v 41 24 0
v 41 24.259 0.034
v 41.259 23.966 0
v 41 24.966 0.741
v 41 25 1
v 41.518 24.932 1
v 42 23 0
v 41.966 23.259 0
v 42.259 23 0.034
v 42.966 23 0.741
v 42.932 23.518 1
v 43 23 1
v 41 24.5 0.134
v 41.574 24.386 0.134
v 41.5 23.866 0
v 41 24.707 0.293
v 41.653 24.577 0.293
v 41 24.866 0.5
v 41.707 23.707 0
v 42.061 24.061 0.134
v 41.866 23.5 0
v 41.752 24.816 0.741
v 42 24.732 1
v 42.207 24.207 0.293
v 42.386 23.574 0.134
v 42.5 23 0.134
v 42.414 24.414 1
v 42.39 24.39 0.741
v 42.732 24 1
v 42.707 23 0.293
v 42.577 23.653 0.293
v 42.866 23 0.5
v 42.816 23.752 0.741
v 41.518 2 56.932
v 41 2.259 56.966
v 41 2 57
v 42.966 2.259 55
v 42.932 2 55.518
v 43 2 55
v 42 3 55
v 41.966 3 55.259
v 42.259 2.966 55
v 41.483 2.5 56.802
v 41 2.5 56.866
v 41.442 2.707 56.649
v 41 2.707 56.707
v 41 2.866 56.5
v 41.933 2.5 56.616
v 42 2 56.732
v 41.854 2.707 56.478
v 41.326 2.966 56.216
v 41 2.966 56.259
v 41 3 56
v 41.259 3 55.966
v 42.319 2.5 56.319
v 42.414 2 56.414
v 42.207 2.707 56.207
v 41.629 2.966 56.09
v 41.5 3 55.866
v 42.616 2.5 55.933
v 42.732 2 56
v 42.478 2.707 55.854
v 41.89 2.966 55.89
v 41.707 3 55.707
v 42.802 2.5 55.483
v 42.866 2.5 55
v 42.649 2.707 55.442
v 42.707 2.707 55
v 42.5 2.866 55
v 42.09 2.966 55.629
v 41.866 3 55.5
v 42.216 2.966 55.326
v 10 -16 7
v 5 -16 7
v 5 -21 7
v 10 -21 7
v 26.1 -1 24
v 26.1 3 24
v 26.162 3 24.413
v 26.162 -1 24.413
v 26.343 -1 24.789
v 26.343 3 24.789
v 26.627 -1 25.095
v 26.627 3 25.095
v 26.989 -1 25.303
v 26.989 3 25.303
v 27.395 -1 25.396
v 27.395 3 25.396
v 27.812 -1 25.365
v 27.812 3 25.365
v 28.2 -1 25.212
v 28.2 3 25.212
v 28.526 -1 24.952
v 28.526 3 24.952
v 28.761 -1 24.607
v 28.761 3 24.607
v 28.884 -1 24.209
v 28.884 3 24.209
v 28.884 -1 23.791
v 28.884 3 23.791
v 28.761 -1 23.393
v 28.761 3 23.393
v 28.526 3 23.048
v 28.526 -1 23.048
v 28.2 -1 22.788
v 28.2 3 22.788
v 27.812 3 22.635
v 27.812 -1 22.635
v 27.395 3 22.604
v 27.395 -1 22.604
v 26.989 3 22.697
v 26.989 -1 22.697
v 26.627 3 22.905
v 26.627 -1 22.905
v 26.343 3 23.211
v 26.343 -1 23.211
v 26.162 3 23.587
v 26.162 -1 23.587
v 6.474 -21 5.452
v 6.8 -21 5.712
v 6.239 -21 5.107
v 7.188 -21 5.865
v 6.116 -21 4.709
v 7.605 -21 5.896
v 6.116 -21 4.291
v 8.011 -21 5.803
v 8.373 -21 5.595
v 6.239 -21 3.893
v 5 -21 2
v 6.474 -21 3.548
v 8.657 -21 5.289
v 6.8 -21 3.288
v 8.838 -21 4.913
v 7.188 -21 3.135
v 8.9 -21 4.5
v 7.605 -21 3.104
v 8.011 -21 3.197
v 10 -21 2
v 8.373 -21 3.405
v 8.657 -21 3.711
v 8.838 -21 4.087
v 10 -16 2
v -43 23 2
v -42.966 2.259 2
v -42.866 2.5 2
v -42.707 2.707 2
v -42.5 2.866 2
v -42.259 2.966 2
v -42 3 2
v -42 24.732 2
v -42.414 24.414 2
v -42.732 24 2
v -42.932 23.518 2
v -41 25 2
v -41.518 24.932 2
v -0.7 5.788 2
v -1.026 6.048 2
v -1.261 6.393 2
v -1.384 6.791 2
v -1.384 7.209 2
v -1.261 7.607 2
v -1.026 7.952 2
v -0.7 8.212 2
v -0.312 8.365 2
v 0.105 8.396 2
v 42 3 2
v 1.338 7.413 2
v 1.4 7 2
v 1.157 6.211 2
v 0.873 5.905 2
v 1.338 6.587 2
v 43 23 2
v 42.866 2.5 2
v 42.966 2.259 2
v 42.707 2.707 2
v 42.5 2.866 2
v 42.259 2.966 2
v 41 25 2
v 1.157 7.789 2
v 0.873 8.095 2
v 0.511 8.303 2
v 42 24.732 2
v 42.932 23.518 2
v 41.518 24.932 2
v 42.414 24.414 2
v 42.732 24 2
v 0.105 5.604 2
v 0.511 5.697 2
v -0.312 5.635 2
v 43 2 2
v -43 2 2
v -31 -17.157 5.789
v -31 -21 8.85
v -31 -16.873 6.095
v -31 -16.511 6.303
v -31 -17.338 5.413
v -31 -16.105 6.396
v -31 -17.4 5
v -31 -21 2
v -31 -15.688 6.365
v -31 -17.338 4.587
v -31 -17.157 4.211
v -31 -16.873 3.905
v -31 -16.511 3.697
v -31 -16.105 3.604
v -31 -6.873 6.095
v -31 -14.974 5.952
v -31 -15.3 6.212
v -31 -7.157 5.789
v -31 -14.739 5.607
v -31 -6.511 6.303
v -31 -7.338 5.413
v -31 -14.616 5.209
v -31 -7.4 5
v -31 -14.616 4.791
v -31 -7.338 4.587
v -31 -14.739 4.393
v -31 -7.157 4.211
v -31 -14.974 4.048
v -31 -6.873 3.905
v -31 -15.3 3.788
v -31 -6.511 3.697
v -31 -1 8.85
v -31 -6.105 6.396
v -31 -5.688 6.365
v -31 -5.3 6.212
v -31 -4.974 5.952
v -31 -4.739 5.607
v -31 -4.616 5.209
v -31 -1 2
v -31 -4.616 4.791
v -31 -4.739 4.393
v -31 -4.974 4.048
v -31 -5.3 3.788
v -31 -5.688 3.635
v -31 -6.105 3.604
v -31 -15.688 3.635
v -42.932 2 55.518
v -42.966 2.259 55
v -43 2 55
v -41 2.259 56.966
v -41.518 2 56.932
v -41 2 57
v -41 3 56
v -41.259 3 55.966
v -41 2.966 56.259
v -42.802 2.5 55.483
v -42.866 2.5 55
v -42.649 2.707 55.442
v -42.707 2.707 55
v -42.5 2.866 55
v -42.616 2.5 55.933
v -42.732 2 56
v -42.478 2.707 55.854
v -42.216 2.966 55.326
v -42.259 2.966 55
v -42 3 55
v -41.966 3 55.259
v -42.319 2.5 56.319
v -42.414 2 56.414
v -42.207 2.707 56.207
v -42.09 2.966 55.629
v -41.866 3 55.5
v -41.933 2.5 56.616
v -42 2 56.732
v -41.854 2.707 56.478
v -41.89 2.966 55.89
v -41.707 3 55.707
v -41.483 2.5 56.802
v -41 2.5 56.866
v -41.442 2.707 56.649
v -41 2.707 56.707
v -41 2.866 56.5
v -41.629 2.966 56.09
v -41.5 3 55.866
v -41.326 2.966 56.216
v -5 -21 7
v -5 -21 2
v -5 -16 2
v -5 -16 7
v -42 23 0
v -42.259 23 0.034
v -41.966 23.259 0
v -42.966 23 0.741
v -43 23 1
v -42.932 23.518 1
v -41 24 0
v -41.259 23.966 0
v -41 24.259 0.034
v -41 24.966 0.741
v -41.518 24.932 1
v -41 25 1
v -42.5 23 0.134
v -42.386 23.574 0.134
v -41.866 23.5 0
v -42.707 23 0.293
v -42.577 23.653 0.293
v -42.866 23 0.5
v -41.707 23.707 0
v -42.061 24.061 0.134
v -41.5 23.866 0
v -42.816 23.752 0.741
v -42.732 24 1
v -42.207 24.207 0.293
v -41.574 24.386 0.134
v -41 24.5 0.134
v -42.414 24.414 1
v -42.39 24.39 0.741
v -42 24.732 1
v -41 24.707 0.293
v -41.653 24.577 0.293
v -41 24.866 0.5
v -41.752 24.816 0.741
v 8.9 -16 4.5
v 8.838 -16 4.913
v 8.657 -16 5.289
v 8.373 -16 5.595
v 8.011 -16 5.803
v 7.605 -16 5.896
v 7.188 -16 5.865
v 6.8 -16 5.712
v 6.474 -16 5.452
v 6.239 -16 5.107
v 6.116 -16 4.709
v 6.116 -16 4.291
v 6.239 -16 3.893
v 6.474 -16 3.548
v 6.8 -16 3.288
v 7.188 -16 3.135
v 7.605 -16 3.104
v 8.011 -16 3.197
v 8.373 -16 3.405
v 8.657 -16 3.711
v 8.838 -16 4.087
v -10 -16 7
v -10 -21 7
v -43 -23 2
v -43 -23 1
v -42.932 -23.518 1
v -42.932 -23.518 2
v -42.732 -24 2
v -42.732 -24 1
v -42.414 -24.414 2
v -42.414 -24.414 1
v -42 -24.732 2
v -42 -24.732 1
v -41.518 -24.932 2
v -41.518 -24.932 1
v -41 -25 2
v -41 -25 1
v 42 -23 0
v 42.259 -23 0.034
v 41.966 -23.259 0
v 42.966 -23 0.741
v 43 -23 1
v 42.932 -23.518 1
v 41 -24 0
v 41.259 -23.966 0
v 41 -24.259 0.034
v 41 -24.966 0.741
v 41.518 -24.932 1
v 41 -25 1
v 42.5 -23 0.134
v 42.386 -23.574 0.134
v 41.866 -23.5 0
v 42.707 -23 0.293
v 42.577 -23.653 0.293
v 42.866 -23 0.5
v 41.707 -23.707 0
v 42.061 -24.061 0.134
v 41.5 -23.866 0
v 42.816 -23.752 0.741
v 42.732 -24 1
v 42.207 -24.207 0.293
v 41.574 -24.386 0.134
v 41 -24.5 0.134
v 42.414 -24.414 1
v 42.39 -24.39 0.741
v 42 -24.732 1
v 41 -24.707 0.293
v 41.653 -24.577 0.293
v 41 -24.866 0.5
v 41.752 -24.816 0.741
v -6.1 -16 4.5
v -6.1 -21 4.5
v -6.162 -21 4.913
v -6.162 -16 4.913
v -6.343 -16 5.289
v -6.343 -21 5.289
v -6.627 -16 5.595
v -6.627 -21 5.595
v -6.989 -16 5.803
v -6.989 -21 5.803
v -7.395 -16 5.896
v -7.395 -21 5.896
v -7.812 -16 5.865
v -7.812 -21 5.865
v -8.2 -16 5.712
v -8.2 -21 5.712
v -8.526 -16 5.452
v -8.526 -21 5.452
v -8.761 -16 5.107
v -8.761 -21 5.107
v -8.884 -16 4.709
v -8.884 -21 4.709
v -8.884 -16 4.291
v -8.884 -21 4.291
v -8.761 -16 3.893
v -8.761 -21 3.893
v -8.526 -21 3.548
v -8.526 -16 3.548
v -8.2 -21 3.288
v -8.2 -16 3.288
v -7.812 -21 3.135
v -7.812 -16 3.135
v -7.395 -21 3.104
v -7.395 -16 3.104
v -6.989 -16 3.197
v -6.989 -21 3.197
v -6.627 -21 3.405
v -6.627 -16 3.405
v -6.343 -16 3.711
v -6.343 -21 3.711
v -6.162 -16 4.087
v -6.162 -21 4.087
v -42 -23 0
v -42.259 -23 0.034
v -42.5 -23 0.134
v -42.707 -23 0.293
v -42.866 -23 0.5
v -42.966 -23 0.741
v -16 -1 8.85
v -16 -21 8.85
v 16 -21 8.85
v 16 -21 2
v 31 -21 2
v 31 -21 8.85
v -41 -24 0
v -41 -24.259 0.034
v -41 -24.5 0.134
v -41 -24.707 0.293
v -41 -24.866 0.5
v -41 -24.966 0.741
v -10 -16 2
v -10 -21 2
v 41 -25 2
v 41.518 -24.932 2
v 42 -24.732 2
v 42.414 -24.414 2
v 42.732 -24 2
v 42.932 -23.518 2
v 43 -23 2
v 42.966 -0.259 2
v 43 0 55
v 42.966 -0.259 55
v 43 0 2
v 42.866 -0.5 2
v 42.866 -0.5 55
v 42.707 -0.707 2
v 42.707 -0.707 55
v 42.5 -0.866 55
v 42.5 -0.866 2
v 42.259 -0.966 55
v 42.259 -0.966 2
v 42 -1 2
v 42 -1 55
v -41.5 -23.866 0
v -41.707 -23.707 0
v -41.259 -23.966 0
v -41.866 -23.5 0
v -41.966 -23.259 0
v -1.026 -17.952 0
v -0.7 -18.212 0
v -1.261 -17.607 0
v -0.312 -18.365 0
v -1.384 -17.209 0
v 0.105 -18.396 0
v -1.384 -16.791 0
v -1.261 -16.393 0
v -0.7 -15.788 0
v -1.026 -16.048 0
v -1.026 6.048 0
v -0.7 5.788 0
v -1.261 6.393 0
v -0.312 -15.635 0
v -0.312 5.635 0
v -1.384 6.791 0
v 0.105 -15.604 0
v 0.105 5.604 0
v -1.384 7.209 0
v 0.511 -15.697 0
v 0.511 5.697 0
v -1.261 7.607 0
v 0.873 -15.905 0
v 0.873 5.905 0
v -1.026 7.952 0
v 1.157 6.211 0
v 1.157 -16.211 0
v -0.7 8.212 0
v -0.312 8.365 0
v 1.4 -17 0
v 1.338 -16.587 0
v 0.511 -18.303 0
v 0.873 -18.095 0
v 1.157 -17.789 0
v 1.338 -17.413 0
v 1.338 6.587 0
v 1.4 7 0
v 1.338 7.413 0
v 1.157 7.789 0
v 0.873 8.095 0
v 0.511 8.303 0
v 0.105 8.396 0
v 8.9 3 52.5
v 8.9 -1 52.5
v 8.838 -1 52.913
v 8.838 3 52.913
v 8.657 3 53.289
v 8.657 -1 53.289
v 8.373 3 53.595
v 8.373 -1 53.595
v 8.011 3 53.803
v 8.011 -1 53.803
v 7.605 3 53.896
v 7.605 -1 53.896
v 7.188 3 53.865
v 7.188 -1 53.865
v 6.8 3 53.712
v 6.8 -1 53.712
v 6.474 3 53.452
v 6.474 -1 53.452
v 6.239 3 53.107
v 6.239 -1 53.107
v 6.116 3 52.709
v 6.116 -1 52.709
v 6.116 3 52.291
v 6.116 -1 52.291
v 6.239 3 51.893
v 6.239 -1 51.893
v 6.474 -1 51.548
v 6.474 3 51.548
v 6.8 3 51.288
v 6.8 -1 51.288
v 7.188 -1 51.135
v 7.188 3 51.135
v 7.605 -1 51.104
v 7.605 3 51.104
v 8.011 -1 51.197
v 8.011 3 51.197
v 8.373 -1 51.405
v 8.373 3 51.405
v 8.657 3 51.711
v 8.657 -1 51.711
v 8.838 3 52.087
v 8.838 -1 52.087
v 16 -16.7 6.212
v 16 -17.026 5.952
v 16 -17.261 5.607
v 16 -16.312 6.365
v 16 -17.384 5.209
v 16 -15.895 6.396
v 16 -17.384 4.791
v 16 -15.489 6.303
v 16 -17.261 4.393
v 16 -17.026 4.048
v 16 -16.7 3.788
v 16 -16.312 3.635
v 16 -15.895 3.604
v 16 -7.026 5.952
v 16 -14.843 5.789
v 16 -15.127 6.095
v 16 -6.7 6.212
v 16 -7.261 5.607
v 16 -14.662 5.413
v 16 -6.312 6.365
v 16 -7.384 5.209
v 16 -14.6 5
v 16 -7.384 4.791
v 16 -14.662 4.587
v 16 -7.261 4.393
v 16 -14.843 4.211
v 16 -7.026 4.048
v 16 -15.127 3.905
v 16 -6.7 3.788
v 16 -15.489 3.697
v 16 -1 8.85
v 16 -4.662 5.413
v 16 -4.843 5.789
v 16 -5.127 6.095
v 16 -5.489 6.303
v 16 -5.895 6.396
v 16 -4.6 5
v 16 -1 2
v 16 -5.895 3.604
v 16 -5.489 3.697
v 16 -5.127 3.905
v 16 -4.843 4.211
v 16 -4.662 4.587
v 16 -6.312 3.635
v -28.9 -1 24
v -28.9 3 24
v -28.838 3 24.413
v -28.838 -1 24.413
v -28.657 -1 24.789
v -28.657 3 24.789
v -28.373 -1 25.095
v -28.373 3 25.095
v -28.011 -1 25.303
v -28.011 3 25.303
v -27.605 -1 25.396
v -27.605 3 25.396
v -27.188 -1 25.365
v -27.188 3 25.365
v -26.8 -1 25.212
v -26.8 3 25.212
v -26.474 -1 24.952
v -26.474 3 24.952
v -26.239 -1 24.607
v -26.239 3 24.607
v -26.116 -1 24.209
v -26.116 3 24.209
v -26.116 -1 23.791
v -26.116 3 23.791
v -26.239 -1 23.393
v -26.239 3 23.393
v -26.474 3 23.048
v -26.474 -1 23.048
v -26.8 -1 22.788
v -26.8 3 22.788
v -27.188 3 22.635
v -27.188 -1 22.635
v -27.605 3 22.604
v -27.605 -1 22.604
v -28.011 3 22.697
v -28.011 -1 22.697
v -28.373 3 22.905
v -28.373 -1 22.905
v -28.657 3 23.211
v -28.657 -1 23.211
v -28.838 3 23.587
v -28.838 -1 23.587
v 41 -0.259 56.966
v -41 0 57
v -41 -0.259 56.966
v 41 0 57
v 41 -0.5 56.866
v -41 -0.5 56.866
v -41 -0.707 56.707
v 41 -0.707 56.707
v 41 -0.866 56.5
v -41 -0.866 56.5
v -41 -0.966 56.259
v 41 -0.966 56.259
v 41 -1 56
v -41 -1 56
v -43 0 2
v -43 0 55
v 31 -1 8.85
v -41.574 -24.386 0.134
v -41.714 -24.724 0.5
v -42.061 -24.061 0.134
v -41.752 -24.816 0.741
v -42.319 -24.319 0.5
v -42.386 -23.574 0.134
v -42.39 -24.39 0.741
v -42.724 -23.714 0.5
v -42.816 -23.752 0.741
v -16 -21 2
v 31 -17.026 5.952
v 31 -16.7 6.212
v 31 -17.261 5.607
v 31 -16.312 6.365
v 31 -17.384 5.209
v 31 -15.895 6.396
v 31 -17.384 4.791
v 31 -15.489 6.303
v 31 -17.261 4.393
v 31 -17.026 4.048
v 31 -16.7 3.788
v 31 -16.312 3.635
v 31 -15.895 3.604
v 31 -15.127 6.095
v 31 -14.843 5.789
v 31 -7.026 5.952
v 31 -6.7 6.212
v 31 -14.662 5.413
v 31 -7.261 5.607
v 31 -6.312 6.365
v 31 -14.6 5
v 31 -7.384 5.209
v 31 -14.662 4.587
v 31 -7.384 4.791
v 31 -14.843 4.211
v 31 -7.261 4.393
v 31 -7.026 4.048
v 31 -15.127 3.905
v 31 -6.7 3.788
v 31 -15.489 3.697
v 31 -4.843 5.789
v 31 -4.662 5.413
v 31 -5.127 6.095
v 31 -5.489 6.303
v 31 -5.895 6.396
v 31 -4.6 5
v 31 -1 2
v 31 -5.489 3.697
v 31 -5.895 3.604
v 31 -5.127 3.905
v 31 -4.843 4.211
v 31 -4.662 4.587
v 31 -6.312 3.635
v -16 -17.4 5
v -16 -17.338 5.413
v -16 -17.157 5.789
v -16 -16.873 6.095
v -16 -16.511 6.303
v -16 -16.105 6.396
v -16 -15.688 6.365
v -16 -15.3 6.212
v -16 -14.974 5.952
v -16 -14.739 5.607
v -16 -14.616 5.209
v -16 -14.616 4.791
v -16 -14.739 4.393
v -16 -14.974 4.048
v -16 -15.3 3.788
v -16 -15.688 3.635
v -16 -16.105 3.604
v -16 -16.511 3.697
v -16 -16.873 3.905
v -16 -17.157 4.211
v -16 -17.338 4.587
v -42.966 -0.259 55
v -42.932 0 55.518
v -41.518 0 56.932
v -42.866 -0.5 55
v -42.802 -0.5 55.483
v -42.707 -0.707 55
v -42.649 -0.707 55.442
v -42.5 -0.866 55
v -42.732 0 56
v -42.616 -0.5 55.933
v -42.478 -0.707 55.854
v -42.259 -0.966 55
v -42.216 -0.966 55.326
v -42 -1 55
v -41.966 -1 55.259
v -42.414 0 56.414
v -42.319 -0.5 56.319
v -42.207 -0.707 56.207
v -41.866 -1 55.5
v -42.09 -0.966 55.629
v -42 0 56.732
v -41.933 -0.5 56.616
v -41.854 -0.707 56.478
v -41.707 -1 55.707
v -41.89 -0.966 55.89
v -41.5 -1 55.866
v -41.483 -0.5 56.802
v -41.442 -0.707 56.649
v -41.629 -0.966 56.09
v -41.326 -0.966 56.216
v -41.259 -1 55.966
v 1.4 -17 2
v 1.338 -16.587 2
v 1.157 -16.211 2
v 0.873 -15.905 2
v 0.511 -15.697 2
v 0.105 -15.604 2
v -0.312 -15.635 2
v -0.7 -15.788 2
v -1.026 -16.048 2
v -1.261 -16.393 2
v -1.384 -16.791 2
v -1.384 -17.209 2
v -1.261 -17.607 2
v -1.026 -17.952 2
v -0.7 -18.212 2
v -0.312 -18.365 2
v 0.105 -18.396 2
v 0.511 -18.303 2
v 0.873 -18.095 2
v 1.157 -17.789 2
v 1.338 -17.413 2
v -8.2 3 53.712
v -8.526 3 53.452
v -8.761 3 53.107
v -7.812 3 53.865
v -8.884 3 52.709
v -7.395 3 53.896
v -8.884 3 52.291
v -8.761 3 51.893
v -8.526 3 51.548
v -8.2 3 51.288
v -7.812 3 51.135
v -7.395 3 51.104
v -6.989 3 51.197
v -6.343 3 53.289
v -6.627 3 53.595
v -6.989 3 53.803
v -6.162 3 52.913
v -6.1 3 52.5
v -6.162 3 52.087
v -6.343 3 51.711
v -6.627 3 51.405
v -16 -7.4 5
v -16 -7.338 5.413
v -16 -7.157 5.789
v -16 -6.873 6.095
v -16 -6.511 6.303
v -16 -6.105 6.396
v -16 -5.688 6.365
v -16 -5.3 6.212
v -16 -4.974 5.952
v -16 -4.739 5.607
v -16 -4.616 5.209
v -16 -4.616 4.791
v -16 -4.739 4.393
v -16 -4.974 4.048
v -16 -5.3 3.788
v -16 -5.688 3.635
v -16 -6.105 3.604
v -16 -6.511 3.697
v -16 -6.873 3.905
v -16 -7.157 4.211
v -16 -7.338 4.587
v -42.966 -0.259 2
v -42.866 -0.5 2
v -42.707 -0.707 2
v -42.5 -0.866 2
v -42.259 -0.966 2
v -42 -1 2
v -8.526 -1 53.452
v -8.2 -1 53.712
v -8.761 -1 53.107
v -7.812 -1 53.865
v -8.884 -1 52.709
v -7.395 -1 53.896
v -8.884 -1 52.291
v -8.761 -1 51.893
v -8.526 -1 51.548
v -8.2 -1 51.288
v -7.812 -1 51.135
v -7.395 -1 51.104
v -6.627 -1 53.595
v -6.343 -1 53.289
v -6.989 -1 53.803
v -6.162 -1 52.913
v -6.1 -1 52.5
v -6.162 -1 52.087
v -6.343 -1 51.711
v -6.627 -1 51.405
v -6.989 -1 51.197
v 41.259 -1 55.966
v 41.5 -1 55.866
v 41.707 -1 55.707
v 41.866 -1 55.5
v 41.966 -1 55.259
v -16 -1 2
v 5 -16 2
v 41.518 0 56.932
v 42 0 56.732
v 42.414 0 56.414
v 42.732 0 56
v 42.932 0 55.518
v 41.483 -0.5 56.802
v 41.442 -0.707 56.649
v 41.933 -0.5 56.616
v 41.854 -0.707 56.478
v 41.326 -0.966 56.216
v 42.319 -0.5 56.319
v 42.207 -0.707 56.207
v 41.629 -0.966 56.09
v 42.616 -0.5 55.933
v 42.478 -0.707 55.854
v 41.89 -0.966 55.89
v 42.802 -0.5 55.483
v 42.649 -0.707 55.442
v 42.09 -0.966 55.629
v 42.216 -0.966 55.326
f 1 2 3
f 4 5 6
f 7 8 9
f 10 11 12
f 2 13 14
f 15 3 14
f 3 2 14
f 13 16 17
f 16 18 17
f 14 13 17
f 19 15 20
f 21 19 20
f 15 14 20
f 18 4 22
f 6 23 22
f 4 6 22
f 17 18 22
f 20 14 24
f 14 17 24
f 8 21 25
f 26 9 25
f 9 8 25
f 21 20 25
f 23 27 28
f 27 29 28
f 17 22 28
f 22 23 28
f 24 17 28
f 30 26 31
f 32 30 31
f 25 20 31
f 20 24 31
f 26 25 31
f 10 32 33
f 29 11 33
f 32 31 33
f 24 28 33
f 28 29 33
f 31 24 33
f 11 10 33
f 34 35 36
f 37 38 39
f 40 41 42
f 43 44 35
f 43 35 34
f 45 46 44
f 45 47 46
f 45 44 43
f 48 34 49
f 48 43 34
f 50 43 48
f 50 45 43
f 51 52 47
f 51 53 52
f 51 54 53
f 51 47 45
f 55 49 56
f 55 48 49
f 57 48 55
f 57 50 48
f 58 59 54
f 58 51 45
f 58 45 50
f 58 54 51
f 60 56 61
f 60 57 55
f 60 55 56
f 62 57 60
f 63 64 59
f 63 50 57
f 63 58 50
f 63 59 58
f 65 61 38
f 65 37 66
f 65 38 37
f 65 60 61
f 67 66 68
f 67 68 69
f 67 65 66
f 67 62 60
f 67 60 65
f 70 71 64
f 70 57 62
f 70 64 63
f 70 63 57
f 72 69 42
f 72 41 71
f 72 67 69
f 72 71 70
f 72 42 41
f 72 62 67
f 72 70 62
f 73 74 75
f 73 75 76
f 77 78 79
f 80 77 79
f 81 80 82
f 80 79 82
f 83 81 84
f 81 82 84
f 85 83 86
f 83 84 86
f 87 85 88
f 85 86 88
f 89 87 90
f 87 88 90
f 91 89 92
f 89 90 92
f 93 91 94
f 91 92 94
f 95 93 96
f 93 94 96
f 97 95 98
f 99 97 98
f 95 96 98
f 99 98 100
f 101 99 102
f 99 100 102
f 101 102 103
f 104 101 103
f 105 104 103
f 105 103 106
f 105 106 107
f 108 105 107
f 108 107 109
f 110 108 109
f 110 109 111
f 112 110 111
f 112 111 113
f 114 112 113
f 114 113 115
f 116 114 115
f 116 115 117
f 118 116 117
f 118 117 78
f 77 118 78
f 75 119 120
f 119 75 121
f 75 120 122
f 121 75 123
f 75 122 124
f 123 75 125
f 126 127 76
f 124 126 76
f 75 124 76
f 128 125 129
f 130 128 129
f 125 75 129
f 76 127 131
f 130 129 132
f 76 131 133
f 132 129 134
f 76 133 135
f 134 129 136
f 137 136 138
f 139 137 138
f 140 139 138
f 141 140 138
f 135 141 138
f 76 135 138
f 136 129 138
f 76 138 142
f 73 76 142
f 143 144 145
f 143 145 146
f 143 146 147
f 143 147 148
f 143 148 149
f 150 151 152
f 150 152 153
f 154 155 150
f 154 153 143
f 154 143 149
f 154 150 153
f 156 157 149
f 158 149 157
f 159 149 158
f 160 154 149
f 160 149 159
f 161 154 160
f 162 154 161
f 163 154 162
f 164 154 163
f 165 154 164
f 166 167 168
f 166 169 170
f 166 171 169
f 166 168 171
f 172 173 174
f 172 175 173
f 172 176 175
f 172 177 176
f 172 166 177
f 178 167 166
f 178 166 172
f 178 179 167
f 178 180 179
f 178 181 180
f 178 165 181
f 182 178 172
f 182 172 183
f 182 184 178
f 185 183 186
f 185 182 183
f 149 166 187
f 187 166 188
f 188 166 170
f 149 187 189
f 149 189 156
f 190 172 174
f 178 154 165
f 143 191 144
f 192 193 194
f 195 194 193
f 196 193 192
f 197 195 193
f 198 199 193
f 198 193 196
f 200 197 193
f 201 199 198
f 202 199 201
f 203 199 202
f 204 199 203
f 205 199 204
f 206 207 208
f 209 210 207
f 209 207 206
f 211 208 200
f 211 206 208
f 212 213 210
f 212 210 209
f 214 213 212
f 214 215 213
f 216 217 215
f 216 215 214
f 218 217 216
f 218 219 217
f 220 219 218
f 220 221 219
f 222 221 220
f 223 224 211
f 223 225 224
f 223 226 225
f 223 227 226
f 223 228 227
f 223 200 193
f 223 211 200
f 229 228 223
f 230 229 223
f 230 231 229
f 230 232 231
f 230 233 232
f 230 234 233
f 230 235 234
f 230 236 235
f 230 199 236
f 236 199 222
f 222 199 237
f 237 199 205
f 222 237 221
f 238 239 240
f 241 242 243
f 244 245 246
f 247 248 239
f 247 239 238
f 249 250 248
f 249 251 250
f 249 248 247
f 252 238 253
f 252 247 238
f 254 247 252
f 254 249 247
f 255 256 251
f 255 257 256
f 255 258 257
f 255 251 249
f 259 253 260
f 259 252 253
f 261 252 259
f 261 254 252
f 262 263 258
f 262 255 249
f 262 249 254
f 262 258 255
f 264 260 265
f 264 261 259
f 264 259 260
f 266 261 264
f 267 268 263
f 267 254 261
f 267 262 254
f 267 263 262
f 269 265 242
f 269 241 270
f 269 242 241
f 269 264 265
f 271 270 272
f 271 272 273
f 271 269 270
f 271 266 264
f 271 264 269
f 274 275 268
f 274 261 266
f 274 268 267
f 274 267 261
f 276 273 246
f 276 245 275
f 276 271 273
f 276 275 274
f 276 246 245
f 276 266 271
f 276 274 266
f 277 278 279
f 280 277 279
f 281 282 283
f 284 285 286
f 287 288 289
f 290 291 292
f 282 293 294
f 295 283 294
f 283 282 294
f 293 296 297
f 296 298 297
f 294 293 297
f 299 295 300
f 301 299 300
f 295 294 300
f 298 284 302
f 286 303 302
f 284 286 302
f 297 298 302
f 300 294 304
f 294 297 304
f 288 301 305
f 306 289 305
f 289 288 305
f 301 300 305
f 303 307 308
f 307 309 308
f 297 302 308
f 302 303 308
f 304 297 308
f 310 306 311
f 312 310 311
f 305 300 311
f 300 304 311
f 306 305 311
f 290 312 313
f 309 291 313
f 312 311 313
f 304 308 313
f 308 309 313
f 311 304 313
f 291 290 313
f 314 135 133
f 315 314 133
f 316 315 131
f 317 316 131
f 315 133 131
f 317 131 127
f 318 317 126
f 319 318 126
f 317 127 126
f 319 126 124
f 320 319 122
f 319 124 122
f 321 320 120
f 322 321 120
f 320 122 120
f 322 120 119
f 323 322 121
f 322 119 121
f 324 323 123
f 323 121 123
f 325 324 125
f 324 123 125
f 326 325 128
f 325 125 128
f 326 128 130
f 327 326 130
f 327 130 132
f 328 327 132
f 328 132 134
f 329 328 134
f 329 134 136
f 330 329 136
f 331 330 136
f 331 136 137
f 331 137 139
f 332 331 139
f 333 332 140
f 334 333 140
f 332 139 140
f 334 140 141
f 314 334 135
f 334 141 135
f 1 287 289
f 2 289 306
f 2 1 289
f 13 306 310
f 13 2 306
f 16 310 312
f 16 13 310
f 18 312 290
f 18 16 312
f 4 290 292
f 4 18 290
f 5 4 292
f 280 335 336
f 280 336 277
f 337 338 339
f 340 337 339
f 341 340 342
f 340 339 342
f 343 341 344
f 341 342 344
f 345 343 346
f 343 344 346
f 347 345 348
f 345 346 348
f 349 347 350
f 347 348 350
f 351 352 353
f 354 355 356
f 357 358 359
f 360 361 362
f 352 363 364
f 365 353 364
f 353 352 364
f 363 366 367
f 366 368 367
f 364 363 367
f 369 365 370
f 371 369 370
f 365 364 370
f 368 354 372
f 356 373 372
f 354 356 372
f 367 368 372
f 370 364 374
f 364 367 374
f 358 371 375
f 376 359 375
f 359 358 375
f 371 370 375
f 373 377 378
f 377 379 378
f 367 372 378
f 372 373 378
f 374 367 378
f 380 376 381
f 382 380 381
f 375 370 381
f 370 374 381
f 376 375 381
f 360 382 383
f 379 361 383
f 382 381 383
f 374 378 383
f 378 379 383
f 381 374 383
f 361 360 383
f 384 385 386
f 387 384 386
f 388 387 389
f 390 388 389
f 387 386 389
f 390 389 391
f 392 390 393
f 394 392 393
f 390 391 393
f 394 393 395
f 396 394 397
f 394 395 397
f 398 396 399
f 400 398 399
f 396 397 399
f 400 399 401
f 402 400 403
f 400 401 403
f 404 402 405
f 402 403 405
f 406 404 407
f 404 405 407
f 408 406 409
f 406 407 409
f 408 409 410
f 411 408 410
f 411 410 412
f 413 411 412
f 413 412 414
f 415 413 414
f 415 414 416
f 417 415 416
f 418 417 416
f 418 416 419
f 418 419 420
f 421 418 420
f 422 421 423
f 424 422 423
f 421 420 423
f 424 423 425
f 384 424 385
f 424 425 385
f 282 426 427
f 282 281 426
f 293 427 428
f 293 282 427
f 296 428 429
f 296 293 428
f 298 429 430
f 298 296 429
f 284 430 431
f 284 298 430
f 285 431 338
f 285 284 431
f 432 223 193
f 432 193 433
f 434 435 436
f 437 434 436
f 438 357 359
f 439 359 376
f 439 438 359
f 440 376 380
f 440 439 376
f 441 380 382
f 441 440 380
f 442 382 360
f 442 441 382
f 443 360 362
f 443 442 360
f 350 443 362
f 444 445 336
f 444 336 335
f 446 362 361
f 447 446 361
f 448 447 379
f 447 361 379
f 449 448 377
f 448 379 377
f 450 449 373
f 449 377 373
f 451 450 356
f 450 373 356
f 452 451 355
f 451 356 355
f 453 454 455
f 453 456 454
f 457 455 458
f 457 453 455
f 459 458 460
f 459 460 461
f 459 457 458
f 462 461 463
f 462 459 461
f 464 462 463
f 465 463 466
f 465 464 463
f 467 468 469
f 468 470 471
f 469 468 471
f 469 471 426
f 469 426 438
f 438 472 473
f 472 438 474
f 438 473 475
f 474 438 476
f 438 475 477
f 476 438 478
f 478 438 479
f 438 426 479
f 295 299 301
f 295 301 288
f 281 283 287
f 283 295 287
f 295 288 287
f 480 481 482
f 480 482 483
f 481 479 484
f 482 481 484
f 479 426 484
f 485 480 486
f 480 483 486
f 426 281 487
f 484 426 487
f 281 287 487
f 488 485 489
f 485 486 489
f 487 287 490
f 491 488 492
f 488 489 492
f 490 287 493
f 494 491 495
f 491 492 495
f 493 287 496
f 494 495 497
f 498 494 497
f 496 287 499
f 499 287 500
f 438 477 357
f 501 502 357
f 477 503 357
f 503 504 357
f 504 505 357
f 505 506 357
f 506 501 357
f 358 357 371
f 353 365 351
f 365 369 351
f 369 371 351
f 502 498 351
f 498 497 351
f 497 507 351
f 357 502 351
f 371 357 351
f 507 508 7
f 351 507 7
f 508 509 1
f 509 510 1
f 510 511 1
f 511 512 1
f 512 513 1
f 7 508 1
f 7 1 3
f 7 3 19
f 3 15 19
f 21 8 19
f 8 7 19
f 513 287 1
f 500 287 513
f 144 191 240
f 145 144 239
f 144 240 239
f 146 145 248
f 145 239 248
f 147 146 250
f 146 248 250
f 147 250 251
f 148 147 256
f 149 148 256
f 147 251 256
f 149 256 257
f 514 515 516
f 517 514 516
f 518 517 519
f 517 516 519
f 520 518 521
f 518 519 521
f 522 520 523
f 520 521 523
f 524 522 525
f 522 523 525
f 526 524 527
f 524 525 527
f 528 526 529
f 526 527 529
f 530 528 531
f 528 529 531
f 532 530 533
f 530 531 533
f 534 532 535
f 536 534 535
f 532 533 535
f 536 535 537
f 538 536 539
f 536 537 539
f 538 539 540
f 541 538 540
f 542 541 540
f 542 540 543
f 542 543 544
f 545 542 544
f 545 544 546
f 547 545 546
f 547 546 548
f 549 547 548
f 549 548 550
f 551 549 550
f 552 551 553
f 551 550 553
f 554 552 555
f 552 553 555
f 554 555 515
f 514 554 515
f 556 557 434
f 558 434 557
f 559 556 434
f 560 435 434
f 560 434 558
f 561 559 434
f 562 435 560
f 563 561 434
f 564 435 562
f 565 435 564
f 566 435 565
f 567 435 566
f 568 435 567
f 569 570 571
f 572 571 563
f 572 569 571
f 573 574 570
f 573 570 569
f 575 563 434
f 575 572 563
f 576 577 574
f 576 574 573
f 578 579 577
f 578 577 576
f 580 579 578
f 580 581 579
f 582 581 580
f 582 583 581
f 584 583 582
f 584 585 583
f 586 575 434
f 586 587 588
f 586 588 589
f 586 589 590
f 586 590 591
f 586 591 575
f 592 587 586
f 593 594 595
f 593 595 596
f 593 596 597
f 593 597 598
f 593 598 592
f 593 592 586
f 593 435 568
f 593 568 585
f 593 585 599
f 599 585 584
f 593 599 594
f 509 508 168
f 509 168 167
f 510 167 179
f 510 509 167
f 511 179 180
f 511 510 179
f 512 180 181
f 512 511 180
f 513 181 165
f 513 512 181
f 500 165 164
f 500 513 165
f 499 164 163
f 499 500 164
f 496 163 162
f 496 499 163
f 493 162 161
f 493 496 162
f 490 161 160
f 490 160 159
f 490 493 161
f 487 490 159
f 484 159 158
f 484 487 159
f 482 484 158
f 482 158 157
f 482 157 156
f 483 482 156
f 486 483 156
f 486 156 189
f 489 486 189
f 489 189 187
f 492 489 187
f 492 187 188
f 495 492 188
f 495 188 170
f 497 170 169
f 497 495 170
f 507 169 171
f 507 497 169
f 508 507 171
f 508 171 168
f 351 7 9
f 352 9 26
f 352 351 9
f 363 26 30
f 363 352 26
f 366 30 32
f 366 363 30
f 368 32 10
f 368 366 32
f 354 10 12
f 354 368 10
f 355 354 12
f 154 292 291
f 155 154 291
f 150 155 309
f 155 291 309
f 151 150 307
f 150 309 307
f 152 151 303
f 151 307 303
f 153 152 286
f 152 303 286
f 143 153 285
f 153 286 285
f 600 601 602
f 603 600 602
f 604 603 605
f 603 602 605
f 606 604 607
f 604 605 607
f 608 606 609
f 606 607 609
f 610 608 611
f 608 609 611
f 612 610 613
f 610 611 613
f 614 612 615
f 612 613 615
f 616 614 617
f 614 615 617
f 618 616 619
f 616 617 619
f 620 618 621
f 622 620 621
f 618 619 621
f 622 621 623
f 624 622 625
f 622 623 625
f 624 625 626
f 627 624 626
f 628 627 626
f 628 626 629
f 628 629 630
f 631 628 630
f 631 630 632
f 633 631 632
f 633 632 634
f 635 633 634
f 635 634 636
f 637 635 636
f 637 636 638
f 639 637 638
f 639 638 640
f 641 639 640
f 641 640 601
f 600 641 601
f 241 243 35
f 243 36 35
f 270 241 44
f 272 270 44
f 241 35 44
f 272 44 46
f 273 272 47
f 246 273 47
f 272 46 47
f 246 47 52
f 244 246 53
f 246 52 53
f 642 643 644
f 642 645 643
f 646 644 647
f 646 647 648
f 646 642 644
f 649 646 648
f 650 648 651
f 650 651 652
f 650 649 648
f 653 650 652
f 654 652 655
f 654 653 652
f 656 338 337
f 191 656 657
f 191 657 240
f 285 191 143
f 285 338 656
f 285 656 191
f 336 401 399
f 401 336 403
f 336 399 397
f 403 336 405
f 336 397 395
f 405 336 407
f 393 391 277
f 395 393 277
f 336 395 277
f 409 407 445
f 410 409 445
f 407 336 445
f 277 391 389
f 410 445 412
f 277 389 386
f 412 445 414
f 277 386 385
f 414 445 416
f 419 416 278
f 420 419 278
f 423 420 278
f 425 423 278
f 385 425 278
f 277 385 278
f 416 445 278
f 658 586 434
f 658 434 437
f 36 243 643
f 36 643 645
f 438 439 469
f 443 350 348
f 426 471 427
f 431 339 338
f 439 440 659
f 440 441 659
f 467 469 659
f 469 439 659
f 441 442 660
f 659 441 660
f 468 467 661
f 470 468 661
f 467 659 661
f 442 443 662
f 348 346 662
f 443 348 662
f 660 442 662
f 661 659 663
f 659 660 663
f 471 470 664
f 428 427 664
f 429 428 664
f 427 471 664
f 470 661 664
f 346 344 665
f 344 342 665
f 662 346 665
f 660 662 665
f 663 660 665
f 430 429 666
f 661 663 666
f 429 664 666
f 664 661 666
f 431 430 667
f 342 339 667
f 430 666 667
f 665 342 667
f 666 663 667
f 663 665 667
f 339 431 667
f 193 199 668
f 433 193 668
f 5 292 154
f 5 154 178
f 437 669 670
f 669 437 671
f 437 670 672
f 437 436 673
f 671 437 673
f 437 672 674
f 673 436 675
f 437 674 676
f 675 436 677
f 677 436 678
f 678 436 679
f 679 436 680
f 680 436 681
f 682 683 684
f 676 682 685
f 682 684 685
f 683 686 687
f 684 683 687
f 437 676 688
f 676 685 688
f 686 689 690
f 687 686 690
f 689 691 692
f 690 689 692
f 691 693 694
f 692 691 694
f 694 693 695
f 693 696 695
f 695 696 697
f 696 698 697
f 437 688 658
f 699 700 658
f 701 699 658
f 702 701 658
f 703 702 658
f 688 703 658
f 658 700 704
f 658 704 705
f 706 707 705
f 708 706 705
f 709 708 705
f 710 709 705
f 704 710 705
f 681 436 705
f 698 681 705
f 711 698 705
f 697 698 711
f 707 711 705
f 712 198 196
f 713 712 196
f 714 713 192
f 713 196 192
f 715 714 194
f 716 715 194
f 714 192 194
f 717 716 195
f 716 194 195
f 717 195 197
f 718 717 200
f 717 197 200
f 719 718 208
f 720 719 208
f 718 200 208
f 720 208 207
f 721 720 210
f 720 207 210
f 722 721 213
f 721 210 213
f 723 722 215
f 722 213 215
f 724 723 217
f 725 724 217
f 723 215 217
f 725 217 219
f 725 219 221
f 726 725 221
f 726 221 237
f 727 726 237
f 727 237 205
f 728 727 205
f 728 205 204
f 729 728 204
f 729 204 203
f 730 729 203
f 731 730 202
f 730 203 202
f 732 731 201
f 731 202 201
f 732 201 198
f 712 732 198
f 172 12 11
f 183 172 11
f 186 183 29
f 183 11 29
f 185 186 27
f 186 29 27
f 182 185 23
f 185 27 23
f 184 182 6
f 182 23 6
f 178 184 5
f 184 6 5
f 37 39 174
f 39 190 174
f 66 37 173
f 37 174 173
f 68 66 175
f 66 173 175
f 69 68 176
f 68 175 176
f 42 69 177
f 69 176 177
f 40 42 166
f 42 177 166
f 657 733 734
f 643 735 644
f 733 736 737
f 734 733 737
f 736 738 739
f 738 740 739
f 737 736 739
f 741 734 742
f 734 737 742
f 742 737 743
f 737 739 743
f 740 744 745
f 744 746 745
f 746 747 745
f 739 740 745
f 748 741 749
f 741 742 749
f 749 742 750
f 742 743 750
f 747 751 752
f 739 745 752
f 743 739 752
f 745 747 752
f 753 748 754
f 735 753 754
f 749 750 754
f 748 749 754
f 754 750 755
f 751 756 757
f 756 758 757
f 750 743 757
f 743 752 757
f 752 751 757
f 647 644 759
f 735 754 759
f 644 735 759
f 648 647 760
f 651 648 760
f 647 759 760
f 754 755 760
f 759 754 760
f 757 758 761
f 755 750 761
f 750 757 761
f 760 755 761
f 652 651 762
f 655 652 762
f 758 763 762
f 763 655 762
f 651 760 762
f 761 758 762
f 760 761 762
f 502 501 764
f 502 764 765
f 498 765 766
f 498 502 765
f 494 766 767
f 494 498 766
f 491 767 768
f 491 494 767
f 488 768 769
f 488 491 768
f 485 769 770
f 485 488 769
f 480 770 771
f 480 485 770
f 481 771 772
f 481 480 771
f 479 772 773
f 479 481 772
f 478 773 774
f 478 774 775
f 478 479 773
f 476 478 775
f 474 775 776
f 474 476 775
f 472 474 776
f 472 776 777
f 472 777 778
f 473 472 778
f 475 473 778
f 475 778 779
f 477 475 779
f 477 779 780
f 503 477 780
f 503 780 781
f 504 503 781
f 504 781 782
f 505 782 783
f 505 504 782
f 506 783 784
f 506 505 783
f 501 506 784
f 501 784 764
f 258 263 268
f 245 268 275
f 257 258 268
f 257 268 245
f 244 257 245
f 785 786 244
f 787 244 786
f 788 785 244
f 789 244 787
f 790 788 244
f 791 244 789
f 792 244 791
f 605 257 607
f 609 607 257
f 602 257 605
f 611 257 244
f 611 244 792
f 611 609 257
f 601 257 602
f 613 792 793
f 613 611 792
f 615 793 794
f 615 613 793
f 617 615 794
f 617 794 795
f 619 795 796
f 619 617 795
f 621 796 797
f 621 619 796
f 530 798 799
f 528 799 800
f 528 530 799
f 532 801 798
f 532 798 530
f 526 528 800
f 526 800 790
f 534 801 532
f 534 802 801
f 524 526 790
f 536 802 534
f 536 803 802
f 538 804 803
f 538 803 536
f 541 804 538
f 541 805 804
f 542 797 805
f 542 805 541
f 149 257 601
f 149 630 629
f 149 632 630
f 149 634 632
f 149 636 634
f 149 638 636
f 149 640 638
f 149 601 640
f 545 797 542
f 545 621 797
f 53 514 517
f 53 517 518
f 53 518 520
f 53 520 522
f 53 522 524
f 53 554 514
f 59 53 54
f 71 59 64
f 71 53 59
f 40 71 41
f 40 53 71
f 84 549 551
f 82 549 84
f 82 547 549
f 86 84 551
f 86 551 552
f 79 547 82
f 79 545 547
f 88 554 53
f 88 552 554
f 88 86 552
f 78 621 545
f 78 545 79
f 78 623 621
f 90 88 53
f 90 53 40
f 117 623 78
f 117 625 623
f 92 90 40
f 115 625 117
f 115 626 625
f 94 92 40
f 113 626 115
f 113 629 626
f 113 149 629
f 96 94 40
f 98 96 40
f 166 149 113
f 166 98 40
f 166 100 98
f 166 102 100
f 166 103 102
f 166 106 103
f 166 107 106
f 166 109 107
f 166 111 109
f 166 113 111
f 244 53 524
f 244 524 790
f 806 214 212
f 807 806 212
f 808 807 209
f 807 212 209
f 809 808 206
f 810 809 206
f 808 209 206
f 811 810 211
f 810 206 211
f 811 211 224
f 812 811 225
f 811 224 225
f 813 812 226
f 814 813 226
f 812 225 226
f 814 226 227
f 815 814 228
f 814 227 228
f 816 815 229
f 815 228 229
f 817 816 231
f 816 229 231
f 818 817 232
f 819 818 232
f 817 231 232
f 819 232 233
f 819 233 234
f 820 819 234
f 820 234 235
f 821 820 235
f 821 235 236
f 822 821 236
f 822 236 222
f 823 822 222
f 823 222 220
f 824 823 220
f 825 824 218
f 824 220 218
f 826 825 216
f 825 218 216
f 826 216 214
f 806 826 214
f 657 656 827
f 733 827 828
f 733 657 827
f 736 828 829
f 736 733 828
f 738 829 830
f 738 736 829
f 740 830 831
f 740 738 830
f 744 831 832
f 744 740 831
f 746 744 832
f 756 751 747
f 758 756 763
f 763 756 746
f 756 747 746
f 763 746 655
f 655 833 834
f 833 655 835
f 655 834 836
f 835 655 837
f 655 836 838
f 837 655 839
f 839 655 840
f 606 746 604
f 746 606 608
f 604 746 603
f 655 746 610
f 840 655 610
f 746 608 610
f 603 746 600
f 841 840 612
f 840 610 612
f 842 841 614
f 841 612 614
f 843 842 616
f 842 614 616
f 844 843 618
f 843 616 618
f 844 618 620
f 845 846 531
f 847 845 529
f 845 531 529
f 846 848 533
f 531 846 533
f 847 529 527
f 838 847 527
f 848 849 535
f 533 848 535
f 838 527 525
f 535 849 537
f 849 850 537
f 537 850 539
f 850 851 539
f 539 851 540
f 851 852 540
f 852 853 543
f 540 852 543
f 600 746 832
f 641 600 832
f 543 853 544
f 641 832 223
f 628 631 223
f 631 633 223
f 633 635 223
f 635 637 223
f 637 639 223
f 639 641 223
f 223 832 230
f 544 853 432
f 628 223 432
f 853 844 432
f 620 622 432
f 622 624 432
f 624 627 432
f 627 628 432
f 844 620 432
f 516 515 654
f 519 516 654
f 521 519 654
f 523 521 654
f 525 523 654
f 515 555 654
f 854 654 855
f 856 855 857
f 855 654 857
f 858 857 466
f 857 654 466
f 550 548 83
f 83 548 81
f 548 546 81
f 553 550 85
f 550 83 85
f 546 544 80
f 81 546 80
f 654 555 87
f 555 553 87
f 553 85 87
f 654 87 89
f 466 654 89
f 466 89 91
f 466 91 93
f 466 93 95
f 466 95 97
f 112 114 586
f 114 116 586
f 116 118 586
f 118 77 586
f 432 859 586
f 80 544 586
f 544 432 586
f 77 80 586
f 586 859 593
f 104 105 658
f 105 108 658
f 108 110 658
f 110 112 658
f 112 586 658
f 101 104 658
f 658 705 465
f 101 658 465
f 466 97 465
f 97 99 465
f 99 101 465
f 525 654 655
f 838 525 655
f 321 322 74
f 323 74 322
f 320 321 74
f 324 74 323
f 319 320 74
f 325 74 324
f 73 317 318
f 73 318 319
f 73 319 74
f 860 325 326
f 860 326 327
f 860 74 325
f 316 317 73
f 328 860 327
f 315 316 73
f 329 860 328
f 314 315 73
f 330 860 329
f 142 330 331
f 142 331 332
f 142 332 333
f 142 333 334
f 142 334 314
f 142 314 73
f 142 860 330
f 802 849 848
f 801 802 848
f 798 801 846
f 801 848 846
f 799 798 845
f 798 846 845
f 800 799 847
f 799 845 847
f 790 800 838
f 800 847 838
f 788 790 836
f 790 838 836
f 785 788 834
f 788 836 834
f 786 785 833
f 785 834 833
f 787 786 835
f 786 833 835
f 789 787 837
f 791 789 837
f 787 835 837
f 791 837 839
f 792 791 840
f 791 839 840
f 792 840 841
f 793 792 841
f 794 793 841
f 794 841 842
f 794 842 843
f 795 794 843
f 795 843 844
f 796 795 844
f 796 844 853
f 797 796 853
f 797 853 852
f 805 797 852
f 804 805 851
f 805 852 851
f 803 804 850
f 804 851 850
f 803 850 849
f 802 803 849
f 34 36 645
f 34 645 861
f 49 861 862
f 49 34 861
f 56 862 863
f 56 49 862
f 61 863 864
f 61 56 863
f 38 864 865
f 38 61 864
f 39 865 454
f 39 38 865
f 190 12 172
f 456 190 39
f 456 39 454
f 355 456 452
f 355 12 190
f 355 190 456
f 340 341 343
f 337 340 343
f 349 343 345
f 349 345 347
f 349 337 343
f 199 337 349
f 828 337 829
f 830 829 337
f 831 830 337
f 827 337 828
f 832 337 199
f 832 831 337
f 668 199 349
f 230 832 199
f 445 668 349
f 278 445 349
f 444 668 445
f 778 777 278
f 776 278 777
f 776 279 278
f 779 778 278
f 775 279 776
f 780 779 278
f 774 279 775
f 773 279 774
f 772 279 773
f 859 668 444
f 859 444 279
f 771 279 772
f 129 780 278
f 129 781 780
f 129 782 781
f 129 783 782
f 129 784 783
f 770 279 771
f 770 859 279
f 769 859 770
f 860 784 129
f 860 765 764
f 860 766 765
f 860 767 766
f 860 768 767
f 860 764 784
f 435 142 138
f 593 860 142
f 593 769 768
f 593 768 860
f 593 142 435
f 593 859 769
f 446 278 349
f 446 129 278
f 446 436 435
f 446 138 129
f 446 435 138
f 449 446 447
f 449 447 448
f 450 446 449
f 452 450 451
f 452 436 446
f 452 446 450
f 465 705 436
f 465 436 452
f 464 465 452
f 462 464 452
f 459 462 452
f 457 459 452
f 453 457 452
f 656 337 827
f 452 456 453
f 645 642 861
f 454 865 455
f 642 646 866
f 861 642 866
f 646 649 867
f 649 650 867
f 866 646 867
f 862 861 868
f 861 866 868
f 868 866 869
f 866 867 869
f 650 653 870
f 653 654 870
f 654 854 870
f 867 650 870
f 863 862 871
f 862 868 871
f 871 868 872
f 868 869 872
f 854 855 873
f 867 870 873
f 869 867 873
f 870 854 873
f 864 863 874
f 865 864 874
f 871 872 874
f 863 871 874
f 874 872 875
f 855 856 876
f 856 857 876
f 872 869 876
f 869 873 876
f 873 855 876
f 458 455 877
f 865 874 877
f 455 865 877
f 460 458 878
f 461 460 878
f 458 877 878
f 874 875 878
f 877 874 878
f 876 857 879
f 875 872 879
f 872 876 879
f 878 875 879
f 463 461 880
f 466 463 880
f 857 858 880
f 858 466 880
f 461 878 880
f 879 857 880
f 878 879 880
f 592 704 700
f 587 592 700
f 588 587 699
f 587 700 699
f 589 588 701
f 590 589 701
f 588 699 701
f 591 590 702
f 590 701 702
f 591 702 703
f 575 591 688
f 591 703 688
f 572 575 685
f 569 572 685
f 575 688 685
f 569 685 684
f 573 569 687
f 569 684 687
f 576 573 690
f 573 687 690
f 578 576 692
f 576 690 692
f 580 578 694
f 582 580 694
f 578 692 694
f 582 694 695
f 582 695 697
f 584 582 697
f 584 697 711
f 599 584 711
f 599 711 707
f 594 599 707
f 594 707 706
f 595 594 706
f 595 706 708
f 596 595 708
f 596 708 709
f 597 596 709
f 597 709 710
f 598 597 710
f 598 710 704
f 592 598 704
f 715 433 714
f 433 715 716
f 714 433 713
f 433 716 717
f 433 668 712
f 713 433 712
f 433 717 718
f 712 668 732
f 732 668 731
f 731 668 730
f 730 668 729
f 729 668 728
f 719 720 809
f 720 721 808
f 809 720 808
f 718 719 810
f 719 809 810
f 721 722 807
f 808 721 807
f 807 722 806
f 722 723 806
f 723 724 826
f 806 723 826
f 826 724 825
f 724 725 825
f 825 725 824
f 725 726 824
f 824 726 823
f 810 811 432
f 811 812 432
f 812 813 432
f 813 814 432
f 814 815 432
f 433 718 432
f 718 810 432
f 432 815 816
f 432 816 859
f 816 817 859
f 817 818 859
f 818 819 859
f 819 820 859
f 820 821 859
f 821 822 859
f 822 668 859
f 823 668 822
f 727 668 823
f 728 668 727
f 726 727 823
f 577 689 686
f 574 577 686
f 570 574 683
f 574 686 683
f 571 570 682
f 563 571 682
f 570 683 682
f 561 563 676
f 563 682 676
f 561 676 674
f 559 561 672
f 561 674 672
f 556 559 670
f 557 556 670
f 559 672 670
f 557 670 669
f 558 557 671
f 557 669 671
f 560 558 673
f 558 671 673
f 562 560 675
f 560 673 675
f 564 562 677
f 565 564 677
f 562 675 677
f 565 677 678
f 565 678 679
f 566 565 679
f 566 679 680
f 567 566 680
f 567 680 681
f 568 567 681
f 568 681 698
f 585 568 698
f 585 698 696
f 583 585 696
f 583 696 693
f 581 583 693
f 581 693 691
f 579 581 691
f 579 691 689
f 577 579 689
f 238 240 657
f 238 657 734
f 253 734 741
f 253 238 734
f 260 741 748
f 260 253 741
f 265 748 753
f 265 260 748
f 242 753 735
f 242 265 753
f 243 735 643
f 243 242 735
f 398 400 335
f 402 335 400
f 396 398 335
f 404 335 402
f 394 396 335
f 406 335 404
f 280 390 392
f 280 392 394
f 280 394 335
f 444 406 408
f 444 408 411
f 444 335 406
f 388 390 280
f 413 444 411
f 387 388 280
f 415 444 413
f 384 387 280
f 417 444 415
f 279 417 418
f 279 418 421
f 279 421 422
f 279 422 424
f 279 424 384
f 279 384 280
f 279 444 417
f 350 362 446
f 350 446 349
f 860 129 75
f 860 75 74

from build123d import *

# Parameters (mm, degrees)
SKETCH_R        = 1.4
PAD_DEPTH       = 2
SKETCH001_W     = 86
SKETCH001_H     = 4
PAD001_DEPTH    = 55
FILLET_R        = 2
FILLET001_R     = 2
FILLET002_R     = 1
FILLET003_R     = 1
FILLET004_R     = 1
SKETCH002_R     = 1.4
POCKET_DEPTH    = 5
SKETCH003_W     = 15
SKETCH003_H     = 20
PAD002_DEPTH    = 6.85
SKETCH004_R     = 1.4
POCKET001_DEPTH = 15
SKETCH005_R     = 1.4
POCKET002_DEPTH = 20
SKETCH006_W     = 5
SKETCH006_H     = 5
PAD003_DEPTH    = 5
SKETCH007_R     = 1.4
POCKET003_DEPTH = 5
SKETCH008_R     = 1.4
POCKET004_DEPTH = 5
SKETCH009_R     = 1.4
POCKET005_DEPTH = 4


with BuildPart() as part:
    # Sketch → Pad (new body)
    with BuildSketch(Plane.XY):
        with BuildLine():
            ThreePointArc((-41, 25), (-42.414214, 24.414214), (-43, 23))
            Line((-43, -23), (-43, 23))
            ThreePointArc((-43, -23), (-42.414214, -24.414214), (-41, -25))
            Line((41, -25), (-41, -25))
            ThreePointArc((41, -25), (42.414214, -24.414214), (43, -23))
            Line((43, 23), (43, -23))
            ThreePointArc((43, 23), (42.414214, 24.414214), (41, 25))
            Line((-41, 25), (41, 25))
        make_face()
        with Locations((0, 7)):
            Circle(SKETCH_R, mode=Mode.SUBTRACT)
        with Locations((0, -17)):
            Circle(SKETCH_R, mode=Mode.SUBTRACT)
    extrude(amount=PAD_DEPTH)

    # Sketch001 (on Face12 of Pad) → Pad001 (join)
    with BuildSketch(Plane.XY.offset(2)):
        with Locations((0, 1)):
            Rectangle(SKETCH001_W, SKETCH001_H)
    extrude(amount=PAD001_DEPTH)

    # Fillet
    fillet_edges = [part.edges().sort_by_distance(p)[0] for p in [
        (-43, 1, 57),
    ]]
    fillet(fillet_edges, radius=FILLET_R)

    # Fillet001
    fillet001_edges = [part.edges().sort_by_distance(p)[0] for p in [
        (43, 1, 57),
    ]]
    fillet(fillet001_edges, radius=FILLET001_R)

    # Fillet002
    fillet002_edges = [part.edges().sort_by_distance(p)[0] for p in [
        (-43, 3, 28.5),
    ]]
    fillet(fillet002_edges, radius=FILLET002_R)

    # Fillet003
    fillet003_edges = [part.edges().sort_by_distance(p)[0] for p in [
        (-43, -1, 28.5),
    ]]
    fillet(fillet003_edges, radius=FILLET003_R)

    # Fillet004
    fillet004_edges = [part.edges().sort_by_distance(p)[0] for p in [
        (-43, 0, 0),
    ]]
    fillet(fillet004_edges, radius=FILLET004_R)

    # Sketch002 (on Face12 of Fillet004) → Pocket (cut)
    with BuildSketch(Plane(origin=(0, 3, 0), x_dir=(-1, 0, 0), z_dir=(0, 1, 0))):
        with Locations((-27.5, 24)):
            Circle(SKETCH002_R)
        with Locations((27.5, 24)):
            Circle(SKETCH002_R)
    extrude(amount=-POCKET_DEPTH, mode=Mode.SUBTRACT)

    # Sketch003 (on Face6 of Pocket) → Pad002 (join)
    with BuildSketch(Plane.XY.offset(2)):
        with Locations((-23.5, -11)):
            Rectangle(SKETCH003_W, SKETCH003_H)
        with Locations((23.5, -11)):
            Rectangle(SKETCH003_W, SKETCH003_H)
    extrude(amount=PAD002_DEPTH)

    # Sketch004 (on Face23 of Pad002) → Pocket001 (cut)
    with BuildSketch(Plane(origin=(-31, 0, 0), x_dir=(0, -1, 0), z_dir=(-1, 0, 0))):
        with Locations((6, 5)):
            Circle(SKETCH004_R)
        with Locations((16, 5)):
            Circle(SKETCH004_R)
    extrude(amount=-POCKET001_DEPTH, mode=Mode.SUBTRACT)

    # Sketch005 (on Face28 of Pocket001) → Pocket002 (cut)
    with BuildSketch(Plane.YZ.offset(31)):
        with Locations((-16, 5)):
            Circle(SKETCH005_R)
        with Locations((-6, 5)):
            Circle(SKETCH005_R)
    extrude(amount=-POCKET002_DEPTH, mode=Mode.SUBTRACT)

    # Sketch006 (on Face6 of Pocket002) → Pad003 (join)
    with BuildSketch(Plane.XY.offset(2)):
        with Locations((-7.5, -18.5)):
            Rectangle(SKETCH006_W, SKETCH006_H)
        with Locations((7.5, -18.5)):
            Rectangle(SKETCH006_W, SKETCH006_H)
    extrude(amount=PAD003_DEPTH)

    # Sketch007 (on Face30 of Pad003) → Pocket003 (cut)
    with BuildSketch(Plane.XZ.offset(21)):
        with Locations((-7.5, 4.5)):
            Circle(SKETCH007_R)
    extrude(amount=-POCKET003_DEPTH, mode=Mode.SUBTRACT)

    # Sketch008 (on Face34 of Pocket003) → Pocket004 (cut)
    with BuildSketch(Plane.XZ.offset(21)):
        with Locations((7.5, 4.5)):
            Circle(SKETCH008_R)
    extrude(amount=-POCKET004_DEPTH, mode=Mode.SUBTRACT)

    # Sketch009 (on Face20 of Pocket004) → Pocket005 (cut)
    with BuildSketch(Plane.XZ.offset(1)):
        with Locations((-7.5, 52.5)):
            Circle(SKETCH009_R)
        with Locations((7.5, 52.5)):
            Circle(SKETCH009_R)
    extrude(amount=-POCKET005_DEPTH, mode=Mode.SUBTRACT)


solid = part.part
